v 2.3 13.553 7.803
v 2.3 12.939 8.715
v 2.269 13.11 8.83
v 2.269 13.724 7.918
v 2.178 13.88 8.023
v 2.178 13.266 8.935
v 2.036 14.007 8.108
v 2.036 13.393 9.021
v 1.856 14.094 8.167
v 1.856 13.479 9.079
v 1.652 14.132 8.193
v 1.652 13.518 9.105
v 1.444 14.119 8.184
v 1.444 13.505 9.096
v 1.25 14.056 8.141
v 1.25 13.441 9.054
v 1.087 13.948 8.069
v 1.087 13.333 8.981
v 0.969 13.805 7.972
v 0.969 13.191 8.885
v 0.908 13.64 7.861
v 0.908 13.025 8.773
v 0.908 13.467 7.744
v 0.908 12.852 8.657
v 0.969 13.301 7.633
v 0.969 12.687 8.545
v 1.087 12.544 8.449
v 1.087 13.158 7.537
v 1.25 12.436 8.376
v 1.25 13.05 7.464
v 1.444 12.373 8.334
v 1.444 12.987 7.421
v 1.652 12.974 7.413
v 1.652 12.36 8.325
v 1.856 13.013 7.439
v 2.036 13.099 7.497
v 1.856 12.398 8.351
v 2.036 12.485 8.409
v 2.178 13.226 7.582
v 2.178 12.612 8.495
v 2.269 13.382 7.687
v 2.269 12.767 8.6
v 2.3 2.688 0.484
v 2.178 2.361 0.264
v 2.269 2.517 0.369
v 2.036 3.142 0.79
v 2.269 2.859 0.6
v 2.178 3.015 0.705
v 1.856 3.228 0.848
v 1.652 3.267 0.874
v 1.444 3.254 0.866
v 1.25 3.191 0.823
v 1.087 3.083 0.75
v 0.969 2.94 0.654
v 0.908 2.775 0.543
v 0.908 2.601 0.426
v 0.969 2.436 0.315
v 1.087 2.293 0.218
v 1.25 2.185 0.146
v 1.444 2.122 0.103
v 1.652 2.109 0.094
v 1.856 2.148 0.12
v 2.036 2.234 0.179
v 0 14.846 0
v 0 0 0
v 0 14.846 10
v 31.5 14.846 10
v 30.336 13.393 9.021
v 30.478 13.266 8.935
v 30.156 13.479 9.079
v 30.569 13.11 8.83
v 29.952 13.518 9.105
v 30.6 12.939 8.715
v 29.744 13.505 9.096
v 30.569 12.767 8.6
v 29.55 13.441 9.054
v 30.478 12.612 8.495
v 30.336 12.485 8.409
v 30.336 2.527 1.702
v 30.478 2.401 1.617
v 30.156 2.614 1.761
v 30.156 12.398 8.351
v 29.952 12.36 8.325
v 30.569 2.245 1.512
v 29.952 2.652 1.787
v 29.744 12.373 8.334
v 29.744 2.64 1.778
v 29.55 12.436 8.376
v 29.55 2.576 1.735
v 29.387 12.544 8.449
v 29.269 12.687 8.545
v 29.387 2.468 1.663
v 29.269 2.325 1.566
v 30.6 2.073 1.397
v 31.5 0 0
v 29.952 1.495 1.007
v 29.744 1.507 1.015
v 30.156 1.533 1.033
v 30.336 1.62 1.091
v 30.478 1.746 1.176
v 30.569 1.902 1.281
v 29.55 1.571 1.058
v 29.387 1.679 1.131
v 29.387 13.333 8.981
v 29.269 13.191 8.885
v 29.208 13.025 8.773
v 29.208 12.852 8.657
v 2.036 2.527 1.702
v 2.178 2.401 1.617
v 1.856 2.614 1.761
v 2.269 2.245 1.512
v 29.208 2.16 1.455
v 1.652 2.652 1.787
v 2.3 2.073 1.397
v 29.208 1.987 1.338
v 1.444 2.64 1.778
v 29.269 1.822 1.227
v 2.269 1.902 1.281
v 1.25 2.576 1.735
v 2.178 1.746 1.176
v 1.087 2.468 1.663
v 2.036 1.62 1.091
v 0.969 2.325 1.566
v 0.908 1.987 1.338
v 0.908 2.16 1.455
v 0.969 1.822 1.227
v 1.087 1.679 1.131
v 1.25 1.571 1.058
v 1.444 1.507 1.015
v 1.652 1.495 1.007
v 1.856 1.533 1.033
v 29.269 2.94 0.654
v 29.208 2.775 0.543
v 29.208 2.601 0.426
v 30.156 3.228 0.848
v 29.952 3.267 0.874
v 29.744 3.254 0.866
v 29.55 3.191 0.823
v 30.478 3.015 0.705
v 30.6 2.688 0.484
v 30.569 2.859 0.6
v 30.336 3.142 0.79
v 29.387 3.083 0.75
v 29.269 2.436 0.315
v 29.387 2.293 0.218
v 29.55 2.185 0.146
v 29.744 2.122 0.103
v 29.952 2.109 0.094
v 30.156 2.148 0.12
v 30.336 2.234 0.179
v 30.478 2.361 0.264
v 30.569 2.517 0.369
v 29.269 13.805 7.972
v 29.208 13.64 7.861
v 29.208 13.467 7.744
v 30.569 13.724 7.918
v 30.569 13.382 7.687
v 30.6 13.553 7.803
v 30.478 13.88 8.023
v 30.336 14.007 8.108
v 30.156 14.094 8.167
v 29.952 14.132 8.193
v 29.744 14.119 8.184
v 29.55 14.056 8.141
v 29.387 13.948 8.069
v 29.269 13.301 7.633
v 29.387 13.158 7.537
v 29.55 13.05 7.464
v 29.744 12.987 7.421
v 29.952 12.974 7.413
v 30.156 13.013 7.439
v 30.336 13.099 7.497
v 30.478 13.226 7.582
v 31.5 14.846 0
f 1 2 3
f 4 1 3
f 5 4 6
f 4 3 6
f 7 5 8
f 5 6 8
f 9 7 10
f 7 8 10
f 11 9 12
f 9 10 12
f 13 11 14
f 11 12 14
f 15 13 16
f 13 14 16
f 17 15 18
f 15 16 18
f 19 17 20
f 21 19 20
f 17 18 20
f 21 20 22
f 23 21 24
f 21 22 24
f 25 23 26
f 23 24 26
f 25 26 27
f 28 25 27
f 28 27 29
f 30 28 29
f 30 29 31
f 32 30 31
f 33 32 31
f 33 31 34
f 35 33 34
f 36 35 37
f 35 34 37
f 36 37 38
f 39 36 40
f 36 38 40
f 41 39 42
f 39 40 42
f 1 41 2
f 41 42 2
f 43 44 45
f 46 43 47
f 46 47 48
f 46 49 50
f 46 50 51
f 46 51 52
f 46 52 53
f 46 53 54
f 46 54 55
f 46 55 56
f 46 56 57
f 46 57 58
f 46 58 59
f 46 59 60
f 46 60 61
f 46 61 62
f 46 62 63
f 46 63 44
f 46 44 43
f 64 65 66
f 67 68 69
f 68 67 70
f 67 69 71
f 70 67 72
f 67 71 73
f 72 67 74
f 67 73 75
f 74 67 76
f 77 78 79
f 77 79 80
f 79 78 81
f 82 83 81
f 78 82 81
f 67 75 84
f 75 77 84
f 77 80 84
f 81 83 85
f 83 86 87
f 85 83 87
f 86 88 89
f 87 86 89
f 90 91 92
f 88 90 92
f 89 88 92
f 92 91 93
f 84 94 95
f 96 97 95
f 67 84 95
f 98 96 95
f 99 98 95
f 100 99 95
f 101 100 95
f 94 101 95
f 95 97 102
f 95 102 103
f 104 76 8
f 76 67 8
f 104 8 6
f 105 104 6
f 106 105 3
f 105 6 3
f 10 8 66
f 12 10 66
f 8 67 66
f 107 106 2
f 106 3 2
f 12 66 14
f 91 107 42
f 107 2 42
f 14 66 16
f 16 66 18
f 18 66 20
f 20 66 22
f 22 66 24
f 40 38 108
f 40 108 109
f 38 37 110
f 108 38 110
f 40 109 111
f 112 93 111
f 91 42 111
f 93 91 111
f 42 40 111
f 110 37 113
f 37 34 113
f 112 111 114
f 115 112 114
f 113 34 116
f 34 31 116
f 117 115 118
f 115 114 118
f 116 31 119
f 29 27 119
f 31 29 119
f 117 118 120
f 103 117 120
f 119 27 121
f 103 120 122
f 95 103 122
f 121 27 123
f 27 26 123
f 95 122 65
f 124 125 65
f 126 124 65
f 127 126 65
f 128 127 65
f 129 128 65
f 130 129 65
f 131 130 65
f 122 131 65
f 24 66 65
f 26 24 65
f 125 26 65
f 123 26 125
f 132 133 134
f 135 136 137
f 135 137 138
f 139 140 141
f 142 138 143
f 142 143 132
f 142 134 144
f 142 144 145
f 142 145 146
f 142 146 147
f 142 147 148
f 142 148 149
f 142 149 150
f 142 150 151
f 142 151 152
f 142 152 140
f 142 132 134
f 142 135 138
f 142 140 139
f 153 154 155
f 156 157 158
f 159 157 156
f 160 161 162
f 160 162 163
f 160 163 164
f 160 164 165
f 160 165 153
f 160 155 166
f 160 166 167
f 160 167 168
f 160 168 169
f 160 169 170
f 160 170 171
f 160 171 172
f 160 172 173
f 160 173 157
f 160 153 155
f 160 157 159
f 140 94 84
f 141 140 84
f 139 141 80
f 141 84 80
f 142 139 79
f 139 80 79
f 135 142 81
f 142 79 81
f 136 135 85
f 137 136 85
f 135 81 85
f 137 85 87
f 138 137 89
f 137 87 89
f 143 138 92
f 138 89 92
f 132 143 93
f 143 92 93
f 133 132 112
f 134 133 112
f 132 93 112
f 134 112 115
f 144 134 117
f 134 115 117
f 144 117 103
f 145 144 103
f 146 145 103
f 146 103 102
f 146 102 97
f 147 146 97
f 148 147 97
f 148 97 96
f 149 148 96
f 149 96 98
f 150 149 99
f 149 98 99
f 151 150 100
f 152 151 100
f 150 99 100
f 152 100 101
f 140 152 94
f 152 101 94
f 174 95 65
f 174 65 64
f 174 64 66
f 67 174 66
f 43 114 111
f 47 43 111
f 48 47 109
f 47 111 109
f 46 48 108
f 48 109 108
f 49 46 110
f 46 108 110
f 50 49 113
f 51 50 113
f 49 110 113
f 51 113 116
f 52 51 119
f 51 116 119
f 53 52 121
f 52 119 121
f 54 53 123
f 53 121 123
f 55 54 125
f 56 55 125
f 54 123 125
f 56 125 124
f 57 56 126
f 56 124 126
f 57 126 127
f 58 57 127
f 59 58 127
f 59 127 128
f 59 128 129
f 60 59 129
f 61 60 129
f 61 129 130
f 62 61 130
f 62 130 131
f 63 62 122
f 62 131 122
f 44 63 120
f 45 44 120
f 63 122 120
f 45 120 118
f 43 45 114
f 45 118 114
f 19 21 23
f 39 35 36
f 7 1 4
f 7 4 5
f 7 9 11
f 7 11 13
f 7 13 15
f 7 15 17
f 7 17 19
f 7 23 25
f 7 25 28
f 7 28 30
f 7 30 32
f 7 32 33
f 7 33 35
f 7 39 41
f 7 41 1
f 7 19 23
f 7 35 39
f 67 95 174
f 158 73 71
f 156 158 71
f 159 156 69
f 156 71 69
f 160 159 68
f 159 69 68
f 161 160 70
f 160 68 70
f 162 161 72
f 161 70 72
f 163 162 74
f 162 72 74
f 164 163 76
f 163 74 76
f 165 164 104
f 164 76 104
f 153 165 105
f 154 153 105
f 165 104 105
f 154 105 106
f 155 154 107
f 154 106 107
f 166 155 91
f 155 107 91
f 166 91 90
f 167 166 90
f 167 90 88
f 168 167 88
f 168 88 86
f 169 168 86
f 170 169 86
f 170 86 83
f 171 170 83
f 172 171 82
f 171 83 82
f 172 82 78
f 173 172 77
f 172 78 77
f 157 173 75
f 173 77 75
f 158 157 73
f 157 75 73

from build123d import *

# Parameters (mm, degrees)
F1_DEPTH = 31.5
F2_R     = 0.7
F3_DEPTH = 1.1


with BuildPart() as f1:
    # F0 (on Right) → F1 (new body)
    with BuildSketch(Plane.YZ):
        Polygon((14.846212, 0), (14.846212, 10), (0, 0), align=None)
    extrude(amount=F1_DEPTH)

    # F2 (on face) → F3 (cut)
    with BuildSketch(Plane(origin=(0, 0, 0), x_dir=(1, 0, 0), z_dir=(0, -0.558659, 0.829397))):
        with Locations((1.6, 15.6)):
            Circle(F2_R)
        with Locations((29.9, 15.6)):
            Circle(F2_R)
        with Locations((29.9, 2.5)):
            Circle(F2_R)
        with Locations((1.6, 2.5)):
            Circle(F2_R)
    extrude(amount=-F3_DEPTH, mode=Mode.SUBTRACT)


solid = f1.part
